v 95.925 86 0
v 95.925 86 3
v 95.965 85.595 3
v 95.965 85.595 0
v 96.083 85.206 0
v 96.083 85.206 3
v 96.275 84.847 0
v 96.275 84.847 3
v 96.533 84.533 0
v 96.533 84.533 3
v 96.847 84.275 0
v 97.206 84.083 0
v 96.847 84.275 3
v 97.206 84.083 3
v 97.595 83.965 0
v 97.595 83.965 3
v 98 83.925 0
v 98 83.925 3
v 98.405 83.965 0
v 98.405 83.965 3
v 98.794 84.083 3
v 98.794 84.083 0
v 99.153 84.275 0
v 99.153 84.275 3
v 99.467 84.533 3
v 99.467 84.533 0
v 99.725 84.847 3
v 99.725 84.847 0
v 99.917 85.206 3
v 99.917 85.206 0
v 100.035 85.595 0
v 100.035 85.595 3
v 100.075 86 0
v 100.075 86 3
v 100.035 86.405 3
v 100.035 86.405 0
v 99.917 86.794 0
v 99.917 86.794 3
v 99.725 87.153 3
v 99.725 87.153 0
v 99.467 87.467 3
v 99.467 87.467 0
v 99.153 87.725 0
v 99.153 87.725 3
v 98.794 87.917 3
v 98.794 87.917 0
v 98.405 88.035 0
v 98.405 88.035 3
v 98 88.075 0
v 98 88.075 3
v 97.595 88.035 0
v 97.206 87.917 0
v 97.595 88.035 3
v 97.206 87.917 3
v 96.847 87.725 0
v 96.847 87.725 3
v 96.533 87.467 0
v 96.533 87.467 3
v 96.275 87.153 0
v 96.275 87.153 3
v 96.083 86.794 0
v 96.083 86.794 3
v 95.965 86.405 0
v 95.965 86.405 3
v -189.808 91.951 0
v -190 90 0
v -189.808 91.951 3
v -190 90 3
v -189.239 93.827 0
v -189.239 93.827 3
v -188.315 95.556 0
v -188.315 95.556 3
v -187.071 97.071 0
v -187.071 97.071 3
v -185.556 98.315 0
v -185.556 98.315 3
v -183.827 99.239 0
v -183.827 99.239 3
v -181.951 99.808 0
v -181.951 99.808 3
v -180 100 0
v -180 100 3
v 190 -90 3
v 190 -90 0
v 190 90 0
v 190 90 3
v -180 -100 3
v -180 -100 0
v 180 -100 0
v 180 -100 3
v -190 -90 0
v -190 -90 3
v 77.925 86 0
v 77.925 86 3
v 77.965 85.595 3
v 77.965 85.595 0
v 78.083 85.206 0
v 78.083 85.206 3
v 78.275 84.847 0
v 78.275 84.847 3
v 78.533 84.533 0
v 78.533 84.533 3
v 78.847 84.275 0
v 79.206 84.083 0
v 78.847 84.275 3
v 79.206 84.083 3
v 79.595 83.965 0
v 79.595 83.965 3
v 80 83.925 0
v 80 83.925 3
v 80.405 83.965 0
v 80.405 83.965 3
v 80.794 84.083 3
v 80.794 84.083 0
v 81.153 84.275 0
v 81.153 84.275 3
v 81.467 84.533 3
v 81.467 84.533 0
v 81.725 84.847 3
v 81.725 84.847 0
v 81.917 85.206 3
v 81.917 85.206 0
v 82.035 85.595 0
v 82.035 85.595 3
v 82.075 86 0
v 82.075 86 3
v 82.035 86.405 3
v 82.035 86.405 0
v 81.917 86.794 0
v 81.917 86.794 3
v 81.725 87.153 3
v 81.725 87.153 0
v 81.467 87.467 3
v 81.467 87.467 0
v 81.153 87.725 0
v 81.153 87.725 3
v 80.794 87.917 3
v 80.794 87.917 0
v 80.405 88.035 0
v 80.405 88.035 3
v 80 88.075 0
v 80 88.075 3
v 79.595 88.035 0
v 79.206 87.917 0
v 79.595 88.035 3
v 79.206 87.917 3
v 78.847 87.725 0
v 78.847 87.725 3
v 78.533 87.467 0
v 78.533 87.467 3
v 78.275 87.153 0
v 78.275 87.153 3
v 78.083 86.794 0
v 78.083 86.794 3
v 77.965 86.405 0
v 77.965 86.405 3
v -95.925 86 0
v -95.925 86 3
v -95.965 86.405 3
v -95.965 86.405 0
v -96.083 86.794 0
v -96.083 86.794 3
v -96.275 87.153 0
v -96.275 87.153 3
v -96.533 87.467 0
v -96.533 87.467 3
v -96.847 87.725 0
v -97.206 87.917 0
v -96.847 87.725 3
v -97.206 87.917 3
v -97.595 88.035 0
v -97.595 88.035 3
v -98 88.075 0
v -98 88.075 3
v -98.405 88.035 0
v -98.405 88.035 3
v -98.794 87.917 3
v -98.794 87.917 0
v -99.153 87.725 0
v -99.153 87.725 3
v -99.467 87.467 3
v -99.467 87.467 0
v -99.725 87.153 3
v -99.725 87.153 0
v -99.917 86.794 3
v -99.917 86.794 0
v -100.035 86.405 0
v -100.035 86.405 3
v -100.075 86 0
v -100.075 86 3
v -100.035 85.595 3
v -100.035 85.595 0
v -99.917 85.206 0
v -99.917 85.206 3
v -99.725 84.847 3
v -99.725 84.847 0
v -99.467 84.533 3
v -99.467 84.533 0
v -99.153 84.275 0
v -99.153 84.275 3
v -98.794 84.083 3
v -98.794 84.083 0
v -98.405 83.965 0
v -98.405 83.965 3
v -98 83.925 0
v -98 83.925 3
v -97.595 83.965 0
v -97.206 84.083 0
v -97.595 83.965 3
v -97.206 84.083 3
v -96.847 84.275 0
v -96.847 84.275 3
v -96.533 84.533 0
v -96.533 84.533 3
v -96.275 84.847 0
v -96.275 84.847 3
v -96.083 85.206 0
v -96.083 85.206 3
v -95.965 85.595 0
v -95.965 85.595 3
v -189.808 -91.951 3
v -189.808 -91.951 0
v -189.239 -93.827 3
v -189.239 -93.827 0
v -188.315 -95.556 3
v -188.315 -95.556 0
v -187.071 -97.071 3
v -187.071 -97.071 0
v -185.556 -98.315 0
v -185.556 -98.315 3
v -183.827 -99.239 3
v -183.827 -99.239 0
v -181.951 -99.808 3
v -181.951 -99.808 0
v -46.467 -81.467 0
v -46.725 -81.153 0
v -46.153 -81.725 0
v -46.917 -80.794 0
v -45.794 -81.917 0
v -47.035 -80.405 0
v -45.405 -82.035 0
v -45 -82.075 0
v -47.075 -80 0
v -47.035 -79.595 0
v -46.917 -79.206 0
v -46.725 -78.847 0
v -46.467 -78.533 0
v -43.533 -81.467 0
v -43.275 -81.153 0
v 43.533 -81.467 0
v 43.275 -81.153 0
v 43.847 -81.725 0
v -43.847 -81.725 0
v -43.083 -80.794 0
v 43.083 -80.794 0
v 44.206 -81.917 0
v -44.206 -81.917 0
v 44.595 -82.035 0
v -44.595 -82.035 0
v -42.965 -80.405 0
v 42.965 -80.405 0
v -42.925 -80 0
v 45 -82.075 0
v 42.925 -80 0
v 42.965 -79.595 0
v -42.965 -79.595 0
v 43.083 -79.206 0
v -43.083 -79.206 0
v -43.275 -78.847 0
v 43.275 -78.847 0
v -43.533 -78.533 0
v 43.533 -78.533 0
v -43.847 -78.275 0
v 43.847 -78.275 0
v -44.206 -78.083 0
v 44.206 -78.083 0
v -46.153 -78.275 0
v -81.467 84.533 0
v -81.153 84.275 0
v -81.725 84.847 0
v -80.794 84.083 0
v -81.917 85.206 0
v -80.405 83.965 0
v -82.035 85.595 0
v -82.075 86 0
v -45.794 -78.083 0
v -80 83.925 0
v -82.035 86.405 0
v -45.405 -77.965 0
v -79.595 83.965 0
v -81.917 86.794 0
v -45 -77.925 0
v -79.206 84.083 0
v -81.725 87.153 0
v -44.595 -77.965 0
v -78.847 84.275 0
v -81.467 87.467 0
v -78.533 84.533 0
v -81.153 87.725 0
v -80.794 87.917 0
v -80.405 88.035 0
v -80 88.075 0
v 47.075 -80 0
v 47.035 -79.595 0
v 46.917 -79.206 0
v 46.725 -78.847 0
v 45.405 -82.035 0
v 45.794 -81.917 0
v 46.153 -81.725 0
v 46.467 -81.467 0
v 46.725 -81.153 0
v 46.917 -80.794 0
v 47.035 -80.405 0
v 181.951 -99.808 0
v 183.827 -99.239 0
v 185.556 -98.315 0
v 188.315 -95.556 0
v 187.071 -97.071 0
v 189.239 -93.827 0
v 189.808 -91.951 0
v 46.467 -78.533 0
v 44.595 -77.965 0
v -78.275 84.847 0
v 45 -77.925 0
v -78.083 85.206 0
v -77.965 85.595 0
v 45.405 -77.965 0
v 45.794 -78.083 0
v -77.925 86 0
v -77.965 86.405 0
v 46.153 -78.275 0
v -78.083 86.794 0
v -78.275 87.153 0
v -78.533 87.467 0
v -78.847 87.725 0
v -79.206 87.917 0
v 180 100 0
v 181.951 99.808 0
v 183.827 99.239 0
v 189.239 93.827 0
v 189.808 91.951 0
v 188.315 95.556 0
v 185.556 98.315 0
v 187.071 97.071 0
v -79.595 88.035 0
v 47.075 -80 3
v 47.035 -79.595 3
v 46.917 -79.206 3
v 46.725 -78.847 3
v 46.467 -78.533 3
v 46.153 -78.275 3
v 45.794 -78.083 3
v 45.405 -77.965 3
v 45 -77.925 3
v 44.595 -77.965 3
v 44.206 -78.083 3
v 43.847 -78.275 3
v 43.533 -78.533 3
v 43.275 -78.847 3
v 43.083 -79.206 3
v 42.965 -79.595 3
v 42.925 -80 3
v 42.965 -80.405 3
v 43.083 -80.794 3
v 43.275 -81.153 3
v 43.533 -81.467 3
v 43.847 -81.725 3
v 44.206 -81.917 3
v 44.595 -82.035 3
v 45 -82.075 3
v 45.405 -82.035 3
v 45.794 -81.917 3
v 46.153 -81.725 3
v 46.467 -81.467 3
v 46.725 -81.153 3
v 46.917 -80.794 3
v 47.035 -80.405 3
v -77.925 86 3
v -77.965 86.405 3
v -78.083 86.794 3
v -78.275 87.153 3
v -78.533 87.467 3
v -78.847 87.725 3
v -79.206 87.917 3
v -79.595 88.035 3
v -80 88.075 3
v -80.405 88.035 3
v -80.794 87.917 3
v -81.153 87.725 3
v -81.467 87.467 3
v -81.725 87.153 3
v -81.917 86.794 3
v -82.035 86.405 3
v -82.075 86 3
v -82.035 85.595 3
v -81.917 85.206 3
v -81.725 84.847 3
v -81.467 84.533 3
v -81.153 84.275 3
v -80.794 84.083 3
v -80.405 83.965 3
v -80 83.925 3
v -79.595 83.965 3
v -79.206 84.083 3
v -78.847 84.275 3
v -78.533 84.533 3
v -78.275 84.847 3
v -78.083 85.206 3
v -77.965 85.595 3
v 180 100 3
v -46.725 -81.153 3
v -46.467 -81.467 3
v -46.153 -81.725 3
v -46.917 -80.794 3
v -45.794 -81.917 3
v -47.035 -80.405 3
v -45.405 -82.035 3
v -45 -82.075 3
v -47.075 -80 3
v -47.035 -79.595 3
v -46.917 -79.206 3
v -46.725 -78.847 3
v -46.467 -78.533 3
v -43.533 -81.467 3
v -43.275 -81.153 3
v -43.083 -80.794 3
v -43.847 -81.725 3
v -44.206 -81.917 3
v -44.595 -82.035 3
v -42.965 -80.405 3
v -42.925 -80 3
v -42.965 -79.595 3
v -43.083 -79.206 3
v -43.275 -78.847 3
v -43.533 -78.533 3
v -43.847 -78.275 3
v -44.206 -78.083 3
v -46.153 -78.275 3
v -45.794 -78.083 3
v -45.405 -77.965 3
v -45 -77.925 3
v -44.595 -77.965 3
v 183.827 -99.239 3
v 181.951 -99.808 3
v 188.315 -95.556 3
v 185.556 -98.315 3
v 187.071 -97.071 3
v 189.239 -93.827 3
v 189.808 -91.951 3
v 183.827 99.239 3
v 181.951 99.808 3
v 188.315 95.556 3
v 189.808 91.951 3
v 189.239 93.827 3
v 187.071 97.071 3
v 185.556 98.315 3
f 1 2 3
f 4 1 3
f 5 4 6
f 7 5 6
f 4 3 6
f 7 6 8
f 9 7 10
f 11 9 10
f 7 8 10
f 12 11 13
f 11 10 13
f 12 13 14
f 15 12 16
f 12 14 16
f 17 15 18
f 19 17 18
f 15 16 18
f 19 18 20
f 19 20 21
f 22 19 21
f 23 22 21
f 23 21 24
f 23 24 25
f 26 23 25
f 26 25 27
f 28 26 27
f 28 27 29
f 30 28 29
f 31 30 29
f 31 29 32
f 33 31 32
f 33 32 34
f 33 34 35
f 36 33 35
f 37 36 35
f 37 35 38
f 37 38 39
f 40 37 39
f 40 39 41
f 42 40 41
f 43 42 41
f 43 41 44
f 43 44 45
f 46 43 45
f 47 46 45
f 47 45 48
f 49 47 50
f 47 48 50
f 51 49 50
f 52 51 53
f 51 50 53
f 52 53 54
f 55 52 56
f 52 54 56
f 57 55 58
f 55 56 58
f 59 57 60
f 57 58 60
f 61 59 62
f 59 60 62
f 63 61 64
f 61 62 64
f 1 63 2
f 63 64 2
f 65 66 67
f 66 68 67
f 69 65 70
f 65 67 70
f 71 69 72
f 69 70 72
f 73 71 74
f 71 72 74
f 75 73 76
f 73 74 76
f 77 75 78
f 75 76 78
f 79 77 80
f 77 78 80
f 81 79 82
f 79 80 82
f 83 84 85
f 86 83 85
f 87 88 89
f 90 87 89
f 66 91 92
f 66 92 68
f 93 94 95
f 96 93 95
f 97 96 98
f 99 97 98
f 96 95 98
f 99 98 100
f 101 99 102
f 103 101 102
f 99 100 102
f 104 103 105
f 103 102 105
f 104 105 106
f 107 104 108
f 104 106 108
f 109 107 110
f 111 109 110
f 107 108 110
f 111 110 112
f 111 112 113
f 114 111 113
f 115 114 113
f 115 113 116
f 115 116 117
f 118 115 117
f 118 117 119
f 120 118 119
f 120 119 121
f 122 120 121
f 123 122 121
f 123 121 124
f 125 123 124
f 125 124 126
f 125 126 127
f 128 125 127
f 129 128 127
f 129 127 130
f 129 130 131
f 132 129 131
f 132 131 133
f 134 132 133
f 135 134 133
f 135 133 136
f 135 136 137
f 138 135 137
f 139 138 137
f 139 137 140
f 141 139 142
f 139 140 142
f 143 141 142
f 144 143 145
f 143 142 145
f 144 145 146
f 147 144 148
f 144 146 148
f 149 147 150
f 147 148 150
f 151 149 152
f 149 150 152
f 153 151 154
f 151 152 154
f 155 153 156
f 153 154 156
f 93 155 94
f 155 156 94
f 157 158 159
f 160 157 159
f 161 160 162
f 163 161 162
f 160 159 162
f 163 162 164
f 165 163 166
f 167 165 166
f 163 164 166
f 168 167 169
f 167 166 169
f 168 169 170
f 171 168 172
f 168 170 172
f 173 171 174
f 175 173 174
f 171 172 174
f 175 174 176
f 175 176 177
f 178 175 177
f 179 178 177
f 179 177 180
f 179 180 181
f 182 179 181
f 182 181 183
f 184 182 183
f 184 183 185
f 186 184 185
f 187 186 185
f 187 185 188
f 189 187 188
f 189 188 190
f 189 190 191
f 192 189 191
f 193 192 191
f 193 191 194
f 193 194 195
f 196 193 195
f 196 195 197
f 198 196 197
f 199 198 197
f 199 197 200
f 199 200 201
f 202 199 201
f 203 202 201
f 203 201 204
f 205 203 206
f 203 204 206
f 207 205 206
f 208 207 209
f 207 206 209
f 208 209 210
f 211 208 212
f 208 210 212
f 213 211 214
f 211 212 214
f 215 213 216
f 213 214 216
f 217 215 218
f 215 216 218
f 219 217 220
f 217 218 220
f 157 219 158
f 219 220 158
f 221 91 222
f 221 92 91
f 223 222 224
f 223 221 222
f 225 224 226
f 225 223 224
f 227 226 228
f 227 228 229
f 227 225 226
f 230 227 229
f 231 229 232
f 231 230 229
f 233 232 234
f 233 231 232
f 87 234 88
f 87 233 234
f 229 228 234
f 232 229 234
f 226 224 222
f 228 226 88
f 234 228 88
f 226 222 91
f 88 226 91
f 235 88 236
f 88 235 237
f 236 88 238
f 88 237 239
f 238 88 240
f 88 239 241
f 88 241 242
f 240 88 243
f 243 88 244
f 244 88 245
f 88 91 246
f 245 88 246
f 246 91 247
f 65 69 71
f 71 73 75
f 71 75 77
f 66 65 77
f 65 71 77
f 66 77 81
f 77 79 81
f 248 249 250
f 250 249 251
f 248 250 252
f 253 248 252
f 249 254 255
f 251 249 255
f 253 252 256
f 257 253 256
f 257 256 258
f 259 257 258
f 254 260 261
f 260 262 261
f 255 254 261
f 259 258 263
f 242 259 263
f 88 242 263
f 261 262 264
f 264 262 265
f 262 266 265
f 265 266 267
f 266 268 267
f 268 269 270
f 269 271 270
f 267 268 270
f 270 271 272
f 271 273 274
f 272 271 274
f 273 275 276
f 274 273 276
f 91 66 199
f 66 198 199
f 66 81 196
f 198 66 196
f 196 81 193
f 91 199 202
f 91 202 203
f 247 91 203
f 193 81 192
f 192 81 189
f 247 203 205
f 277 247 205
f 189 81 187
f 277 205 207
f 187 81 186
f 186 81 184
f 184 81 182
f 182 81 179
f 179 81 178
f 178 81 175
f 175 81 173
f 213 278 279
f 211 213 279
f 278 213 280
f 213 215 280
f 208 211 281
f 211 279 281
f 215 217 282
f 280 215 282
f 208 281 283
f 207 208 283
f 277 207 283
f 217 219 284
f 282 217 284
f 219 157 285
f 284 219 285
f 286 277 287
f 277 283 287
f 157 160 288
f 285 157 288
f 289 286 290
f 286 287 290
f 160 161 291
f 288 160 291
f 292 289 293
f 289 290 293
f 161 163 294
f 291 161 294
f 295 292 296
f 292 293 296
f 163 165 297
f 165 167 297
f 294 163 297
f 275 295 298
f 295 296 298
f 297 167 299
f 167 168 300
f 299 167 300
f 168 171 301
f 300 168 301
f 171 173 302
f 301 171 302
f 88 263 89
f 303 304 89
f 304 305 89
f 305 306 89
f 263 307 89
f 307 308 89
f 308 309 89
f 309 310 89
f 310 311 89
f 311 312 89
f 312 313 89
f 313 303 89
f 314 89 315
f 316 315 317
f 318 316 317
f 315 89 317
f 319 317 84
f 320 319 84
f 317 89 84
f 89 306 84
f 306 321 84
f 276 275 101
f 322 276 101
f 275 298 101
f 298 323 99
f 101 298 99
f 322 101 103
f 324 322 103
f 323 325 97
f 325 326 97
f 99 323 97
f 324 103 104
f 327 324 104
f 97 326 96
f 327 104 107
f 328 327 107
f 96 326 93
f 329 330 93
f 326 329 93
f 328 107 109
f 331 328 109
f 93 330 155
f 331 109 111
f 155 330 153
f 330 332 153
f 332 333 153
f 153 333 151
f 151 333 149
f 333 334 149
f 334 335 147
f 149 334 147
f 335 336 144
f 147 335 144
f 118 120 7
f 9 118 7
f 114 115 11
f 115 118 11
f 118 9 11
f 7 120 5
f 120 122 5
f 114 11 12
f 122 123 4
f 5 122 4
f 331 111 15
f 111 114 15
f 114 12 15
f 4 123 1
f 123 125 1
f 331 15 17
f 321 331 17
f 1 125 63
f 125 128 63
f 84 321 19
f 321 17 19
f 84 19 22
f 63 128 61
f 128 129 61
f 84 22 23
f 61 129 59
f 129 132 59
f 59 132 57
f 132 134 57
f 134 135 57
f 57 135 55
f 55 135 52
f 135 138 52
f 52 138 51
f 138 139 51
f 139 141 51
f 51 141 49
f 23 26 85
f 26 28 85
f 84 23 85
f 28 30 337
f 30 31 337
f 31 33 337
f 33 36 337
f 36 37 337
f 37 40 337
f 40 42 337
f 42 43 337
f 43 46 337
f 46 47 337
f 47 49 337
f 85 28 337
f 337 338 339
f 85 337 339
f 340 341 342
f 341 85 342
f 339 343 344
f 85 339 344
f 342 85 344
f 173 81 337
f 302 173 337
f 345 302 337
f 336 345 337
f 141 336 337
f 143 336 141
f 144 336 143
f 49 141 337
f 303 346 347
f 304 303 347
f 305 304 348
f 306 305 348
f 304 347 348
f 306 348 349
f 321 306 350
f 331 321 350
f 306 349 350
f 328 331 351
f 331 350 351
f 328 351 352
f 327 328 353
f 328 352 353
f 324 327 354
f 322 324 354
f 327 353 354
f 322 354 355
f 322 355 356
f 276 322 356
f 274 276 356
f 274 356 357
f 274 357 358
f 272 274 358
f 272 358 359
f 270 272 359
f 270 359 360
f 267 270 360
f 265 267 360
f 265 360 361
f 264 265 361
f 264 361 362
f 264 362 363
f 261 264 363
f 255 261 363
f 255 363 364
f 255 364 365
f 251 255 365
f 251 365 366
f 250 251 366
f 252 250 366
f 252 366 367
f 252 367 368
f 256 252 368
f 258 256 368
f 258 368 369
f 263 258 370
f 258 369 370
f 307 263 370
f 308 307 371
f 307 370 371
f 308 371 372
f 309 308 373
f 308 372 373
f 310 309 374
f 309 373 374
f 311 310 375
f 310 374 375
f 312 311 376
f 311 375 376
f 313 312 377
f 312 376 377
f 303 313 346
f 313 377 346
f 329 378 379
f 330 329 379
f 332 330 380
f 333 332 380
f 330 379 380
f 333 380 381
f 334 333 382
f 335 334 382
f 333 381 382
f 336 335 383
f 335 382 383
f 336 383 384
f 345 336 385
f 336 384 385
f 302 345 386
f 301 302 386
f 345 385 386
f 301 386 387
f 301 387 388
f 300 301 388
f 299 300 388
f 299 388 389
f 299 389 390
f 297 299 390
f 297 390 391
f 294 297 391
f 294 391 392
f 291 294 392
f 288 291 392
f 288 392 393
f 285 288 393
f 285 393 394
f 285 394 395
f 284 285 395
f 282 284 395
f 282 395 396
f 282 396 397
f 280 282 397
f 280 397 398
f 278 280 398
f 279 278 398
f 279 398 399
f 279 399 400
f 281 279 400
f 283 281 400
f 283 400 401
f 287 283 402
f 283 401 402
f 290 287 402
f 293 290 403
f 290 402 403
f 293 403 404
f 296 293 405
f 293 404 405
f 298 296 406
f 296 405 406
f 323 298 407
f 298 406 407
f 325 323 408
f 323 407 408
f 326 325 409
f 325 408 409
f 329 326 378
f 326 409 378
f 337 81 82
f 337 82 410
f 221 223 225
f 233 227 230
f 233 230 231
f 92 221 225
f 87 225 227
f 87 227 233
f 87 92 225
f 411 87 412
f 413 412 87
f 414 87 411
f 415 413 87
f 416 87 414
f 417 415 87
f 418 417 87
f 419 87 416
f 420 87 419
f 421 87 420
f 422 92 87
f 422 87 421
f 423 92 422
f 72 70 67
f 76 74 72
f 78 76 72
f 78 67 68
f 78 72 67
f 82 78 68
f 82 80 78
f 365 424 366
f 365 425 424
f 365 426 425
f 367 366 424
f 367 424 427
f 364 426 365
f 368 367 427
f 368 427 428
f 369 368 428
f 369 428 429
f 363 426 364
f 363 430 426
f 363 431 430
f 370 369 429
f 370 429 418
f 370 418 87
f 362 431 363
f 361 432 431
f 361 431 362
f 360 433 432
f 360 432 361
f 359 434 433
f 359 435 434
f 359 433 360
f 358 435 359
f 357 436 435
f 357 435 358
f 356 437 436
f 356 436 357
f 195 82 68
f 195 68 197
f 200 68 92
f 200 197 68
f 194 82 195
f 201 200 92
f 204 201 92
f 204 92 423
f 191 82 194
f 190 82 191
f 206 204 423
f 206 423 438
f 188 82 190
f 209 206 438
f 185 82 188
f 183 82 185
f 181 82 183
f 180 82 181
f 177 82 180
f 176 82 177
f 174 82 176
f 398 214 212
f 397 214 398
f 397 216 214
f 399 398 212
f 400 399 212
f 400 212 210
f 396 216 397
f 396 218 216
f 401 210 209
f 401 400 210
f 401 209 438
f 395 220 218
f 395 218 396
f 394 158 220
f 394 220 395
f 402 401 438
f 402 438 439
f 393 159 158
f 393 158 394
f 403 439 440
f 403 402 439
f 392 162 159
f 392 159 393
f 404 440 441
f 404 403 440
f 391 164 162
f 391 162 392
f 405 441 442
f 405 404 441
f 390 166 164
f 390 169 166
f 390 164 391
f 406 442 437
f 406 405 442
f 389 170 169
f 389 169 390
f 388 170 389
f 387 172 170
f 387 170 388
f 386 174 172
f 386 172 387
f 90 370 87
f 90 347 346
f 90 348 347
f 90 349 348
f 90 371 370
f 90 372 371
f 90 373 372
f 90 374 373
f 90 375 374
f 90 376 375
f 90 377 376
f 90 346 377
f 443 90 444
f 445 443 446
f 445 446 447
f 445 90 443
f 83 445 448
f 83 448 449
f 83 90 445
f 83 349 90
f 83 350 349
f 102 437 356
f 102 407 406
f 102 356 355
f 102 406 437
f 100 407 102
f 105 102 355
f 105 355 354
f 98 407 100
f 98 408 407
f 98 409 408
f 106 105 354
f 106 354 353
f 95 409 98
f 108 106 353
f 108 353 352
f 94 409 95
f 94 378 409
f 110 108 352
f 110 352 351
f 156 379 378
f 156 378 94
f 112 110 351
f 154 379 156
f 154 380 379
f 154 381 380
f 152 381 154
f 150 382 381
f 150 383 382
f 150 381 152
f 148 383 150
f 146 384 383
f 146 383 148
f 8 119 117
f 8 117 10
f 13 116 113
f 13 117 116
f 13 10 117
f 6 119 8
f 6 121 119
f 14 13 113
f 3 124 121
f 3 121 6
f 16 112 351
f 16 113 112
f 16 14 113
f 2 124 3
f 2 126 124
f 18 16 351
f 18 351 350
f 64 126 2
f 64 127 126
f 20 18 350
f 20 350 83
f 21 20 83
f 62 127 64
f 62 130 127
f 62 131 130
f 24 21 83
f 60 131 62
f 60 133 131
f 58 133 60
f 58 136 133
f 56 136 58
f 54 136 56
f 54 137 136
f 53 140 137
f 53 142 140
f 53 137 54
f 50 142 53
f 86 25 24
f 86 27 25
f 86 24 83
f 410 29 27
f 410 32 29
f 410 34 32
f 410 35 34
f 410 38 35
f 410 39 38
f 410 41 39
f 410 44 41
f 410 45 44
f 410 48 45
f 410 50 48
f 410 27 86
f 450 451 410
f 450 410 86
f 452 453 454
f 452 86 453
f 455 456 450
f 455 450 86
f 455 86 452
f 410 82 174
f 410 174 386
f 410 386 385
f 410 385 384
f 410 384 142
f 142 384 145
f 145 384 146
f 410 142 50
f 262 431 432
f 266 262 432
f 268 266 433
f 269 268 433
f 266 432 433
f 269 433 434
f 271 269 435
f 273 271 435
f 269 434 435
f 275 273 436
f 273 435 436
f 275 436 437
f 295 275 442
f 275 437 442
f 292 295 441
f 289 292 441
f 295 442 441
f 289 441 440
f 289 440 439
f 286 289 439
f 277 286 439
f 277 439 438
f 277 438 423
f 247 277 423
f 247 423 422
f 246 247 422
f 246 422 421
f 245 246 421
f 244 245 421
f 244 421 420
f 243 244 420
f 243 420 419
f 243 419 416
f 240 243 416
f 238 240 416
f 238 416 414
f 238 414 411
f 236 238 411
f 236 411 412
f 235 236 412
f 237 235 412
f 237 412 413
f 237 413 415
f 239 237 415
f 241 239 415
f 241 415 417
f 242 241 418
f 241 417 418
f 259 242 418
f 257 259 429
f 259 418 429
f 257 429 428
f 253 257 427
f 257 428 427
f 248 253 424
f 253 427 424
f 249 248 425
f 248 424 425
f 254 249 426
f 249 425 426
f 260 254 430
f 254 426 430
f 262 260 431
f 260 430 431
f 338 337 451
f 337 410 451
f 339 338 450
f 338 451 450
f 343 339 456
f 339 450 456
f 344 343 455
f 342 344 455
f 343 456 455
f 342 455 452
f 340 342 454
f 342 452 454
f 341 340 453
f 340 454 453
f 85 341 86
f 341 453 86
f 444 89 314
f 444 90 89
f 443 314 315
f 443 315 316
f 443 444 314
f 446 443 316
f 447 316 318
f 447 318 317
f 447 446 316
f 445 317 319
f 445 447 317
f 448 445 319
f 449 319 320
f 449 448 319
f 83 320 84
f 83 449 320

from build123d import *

# Parameters (mm, degrees)
SKETCH_1_W          = 380
SKETCH_1_H          = 200
EXTRUDE_1_DEPTH     = 3
SKETCH_2_R          = 2.075
CUT_EXTRUDE_1_DEPTH = 215.730063102
FILLET_1_R          = 10
SKETCH_3_R          = 2.075
CUT_EXTRUDE_2_DEPTH = 5


with BuildPart() as part:
    # 草图1 → 凸台-拉伸1 (new body)
    with BuildSketch(Plane.XY):
        Rectangle(SKETCH_1_W, SKETCH_1_H)
    extrude(amount=EXTRUDE_1_DEPTH)

    # 草图2 → 切除-拉伸1 (cut, through all)
    with BuildSketch(Plane.XY.offset(3)):
        with Locations((-98, 86)):
            Circle(SKETCH_2_R)
        with Locations((-80, 86)):
            Circle(SKETCH_2_R)
        with Locations(Location((80, 86, 0), (0, 0, 180))):
            Circle(SKETCH_2_R)
        with Locations(Location((98, 86, 0), (0, 0, 180))):
            Circle(SKETCH_2_R)
    extrude(amount=-CUT_EXTRUDE_1_DEPTH, mode=Mode.SUBTRACT)

    # 圆角1
    fillet_1_edges = [part.edges().sort_by_distance(p)[0] for p in [
        (190, -100, 1.5),
        (-190, -100, 1.5),
        (-190, 100, 1.5),
        (190, 100, 1.5),
    ]]
    fillet(fillet_1_edges, radius=FILLET_1_R)

    # 草图3 → 切除-拉伸2 (cut)
    with BuildSketch(Plane.XY.offset(3)):
        with Locations((-45, -80)):
            Circle(SKETCH_3_R)
        with Locations((45, -80)):
            Circle(SKETCH_3_R)
    extrude(amount=-CUT_EXTRUDE_2_DEPTH, mode=Mode.SUBTRACT)


solid = part.part
